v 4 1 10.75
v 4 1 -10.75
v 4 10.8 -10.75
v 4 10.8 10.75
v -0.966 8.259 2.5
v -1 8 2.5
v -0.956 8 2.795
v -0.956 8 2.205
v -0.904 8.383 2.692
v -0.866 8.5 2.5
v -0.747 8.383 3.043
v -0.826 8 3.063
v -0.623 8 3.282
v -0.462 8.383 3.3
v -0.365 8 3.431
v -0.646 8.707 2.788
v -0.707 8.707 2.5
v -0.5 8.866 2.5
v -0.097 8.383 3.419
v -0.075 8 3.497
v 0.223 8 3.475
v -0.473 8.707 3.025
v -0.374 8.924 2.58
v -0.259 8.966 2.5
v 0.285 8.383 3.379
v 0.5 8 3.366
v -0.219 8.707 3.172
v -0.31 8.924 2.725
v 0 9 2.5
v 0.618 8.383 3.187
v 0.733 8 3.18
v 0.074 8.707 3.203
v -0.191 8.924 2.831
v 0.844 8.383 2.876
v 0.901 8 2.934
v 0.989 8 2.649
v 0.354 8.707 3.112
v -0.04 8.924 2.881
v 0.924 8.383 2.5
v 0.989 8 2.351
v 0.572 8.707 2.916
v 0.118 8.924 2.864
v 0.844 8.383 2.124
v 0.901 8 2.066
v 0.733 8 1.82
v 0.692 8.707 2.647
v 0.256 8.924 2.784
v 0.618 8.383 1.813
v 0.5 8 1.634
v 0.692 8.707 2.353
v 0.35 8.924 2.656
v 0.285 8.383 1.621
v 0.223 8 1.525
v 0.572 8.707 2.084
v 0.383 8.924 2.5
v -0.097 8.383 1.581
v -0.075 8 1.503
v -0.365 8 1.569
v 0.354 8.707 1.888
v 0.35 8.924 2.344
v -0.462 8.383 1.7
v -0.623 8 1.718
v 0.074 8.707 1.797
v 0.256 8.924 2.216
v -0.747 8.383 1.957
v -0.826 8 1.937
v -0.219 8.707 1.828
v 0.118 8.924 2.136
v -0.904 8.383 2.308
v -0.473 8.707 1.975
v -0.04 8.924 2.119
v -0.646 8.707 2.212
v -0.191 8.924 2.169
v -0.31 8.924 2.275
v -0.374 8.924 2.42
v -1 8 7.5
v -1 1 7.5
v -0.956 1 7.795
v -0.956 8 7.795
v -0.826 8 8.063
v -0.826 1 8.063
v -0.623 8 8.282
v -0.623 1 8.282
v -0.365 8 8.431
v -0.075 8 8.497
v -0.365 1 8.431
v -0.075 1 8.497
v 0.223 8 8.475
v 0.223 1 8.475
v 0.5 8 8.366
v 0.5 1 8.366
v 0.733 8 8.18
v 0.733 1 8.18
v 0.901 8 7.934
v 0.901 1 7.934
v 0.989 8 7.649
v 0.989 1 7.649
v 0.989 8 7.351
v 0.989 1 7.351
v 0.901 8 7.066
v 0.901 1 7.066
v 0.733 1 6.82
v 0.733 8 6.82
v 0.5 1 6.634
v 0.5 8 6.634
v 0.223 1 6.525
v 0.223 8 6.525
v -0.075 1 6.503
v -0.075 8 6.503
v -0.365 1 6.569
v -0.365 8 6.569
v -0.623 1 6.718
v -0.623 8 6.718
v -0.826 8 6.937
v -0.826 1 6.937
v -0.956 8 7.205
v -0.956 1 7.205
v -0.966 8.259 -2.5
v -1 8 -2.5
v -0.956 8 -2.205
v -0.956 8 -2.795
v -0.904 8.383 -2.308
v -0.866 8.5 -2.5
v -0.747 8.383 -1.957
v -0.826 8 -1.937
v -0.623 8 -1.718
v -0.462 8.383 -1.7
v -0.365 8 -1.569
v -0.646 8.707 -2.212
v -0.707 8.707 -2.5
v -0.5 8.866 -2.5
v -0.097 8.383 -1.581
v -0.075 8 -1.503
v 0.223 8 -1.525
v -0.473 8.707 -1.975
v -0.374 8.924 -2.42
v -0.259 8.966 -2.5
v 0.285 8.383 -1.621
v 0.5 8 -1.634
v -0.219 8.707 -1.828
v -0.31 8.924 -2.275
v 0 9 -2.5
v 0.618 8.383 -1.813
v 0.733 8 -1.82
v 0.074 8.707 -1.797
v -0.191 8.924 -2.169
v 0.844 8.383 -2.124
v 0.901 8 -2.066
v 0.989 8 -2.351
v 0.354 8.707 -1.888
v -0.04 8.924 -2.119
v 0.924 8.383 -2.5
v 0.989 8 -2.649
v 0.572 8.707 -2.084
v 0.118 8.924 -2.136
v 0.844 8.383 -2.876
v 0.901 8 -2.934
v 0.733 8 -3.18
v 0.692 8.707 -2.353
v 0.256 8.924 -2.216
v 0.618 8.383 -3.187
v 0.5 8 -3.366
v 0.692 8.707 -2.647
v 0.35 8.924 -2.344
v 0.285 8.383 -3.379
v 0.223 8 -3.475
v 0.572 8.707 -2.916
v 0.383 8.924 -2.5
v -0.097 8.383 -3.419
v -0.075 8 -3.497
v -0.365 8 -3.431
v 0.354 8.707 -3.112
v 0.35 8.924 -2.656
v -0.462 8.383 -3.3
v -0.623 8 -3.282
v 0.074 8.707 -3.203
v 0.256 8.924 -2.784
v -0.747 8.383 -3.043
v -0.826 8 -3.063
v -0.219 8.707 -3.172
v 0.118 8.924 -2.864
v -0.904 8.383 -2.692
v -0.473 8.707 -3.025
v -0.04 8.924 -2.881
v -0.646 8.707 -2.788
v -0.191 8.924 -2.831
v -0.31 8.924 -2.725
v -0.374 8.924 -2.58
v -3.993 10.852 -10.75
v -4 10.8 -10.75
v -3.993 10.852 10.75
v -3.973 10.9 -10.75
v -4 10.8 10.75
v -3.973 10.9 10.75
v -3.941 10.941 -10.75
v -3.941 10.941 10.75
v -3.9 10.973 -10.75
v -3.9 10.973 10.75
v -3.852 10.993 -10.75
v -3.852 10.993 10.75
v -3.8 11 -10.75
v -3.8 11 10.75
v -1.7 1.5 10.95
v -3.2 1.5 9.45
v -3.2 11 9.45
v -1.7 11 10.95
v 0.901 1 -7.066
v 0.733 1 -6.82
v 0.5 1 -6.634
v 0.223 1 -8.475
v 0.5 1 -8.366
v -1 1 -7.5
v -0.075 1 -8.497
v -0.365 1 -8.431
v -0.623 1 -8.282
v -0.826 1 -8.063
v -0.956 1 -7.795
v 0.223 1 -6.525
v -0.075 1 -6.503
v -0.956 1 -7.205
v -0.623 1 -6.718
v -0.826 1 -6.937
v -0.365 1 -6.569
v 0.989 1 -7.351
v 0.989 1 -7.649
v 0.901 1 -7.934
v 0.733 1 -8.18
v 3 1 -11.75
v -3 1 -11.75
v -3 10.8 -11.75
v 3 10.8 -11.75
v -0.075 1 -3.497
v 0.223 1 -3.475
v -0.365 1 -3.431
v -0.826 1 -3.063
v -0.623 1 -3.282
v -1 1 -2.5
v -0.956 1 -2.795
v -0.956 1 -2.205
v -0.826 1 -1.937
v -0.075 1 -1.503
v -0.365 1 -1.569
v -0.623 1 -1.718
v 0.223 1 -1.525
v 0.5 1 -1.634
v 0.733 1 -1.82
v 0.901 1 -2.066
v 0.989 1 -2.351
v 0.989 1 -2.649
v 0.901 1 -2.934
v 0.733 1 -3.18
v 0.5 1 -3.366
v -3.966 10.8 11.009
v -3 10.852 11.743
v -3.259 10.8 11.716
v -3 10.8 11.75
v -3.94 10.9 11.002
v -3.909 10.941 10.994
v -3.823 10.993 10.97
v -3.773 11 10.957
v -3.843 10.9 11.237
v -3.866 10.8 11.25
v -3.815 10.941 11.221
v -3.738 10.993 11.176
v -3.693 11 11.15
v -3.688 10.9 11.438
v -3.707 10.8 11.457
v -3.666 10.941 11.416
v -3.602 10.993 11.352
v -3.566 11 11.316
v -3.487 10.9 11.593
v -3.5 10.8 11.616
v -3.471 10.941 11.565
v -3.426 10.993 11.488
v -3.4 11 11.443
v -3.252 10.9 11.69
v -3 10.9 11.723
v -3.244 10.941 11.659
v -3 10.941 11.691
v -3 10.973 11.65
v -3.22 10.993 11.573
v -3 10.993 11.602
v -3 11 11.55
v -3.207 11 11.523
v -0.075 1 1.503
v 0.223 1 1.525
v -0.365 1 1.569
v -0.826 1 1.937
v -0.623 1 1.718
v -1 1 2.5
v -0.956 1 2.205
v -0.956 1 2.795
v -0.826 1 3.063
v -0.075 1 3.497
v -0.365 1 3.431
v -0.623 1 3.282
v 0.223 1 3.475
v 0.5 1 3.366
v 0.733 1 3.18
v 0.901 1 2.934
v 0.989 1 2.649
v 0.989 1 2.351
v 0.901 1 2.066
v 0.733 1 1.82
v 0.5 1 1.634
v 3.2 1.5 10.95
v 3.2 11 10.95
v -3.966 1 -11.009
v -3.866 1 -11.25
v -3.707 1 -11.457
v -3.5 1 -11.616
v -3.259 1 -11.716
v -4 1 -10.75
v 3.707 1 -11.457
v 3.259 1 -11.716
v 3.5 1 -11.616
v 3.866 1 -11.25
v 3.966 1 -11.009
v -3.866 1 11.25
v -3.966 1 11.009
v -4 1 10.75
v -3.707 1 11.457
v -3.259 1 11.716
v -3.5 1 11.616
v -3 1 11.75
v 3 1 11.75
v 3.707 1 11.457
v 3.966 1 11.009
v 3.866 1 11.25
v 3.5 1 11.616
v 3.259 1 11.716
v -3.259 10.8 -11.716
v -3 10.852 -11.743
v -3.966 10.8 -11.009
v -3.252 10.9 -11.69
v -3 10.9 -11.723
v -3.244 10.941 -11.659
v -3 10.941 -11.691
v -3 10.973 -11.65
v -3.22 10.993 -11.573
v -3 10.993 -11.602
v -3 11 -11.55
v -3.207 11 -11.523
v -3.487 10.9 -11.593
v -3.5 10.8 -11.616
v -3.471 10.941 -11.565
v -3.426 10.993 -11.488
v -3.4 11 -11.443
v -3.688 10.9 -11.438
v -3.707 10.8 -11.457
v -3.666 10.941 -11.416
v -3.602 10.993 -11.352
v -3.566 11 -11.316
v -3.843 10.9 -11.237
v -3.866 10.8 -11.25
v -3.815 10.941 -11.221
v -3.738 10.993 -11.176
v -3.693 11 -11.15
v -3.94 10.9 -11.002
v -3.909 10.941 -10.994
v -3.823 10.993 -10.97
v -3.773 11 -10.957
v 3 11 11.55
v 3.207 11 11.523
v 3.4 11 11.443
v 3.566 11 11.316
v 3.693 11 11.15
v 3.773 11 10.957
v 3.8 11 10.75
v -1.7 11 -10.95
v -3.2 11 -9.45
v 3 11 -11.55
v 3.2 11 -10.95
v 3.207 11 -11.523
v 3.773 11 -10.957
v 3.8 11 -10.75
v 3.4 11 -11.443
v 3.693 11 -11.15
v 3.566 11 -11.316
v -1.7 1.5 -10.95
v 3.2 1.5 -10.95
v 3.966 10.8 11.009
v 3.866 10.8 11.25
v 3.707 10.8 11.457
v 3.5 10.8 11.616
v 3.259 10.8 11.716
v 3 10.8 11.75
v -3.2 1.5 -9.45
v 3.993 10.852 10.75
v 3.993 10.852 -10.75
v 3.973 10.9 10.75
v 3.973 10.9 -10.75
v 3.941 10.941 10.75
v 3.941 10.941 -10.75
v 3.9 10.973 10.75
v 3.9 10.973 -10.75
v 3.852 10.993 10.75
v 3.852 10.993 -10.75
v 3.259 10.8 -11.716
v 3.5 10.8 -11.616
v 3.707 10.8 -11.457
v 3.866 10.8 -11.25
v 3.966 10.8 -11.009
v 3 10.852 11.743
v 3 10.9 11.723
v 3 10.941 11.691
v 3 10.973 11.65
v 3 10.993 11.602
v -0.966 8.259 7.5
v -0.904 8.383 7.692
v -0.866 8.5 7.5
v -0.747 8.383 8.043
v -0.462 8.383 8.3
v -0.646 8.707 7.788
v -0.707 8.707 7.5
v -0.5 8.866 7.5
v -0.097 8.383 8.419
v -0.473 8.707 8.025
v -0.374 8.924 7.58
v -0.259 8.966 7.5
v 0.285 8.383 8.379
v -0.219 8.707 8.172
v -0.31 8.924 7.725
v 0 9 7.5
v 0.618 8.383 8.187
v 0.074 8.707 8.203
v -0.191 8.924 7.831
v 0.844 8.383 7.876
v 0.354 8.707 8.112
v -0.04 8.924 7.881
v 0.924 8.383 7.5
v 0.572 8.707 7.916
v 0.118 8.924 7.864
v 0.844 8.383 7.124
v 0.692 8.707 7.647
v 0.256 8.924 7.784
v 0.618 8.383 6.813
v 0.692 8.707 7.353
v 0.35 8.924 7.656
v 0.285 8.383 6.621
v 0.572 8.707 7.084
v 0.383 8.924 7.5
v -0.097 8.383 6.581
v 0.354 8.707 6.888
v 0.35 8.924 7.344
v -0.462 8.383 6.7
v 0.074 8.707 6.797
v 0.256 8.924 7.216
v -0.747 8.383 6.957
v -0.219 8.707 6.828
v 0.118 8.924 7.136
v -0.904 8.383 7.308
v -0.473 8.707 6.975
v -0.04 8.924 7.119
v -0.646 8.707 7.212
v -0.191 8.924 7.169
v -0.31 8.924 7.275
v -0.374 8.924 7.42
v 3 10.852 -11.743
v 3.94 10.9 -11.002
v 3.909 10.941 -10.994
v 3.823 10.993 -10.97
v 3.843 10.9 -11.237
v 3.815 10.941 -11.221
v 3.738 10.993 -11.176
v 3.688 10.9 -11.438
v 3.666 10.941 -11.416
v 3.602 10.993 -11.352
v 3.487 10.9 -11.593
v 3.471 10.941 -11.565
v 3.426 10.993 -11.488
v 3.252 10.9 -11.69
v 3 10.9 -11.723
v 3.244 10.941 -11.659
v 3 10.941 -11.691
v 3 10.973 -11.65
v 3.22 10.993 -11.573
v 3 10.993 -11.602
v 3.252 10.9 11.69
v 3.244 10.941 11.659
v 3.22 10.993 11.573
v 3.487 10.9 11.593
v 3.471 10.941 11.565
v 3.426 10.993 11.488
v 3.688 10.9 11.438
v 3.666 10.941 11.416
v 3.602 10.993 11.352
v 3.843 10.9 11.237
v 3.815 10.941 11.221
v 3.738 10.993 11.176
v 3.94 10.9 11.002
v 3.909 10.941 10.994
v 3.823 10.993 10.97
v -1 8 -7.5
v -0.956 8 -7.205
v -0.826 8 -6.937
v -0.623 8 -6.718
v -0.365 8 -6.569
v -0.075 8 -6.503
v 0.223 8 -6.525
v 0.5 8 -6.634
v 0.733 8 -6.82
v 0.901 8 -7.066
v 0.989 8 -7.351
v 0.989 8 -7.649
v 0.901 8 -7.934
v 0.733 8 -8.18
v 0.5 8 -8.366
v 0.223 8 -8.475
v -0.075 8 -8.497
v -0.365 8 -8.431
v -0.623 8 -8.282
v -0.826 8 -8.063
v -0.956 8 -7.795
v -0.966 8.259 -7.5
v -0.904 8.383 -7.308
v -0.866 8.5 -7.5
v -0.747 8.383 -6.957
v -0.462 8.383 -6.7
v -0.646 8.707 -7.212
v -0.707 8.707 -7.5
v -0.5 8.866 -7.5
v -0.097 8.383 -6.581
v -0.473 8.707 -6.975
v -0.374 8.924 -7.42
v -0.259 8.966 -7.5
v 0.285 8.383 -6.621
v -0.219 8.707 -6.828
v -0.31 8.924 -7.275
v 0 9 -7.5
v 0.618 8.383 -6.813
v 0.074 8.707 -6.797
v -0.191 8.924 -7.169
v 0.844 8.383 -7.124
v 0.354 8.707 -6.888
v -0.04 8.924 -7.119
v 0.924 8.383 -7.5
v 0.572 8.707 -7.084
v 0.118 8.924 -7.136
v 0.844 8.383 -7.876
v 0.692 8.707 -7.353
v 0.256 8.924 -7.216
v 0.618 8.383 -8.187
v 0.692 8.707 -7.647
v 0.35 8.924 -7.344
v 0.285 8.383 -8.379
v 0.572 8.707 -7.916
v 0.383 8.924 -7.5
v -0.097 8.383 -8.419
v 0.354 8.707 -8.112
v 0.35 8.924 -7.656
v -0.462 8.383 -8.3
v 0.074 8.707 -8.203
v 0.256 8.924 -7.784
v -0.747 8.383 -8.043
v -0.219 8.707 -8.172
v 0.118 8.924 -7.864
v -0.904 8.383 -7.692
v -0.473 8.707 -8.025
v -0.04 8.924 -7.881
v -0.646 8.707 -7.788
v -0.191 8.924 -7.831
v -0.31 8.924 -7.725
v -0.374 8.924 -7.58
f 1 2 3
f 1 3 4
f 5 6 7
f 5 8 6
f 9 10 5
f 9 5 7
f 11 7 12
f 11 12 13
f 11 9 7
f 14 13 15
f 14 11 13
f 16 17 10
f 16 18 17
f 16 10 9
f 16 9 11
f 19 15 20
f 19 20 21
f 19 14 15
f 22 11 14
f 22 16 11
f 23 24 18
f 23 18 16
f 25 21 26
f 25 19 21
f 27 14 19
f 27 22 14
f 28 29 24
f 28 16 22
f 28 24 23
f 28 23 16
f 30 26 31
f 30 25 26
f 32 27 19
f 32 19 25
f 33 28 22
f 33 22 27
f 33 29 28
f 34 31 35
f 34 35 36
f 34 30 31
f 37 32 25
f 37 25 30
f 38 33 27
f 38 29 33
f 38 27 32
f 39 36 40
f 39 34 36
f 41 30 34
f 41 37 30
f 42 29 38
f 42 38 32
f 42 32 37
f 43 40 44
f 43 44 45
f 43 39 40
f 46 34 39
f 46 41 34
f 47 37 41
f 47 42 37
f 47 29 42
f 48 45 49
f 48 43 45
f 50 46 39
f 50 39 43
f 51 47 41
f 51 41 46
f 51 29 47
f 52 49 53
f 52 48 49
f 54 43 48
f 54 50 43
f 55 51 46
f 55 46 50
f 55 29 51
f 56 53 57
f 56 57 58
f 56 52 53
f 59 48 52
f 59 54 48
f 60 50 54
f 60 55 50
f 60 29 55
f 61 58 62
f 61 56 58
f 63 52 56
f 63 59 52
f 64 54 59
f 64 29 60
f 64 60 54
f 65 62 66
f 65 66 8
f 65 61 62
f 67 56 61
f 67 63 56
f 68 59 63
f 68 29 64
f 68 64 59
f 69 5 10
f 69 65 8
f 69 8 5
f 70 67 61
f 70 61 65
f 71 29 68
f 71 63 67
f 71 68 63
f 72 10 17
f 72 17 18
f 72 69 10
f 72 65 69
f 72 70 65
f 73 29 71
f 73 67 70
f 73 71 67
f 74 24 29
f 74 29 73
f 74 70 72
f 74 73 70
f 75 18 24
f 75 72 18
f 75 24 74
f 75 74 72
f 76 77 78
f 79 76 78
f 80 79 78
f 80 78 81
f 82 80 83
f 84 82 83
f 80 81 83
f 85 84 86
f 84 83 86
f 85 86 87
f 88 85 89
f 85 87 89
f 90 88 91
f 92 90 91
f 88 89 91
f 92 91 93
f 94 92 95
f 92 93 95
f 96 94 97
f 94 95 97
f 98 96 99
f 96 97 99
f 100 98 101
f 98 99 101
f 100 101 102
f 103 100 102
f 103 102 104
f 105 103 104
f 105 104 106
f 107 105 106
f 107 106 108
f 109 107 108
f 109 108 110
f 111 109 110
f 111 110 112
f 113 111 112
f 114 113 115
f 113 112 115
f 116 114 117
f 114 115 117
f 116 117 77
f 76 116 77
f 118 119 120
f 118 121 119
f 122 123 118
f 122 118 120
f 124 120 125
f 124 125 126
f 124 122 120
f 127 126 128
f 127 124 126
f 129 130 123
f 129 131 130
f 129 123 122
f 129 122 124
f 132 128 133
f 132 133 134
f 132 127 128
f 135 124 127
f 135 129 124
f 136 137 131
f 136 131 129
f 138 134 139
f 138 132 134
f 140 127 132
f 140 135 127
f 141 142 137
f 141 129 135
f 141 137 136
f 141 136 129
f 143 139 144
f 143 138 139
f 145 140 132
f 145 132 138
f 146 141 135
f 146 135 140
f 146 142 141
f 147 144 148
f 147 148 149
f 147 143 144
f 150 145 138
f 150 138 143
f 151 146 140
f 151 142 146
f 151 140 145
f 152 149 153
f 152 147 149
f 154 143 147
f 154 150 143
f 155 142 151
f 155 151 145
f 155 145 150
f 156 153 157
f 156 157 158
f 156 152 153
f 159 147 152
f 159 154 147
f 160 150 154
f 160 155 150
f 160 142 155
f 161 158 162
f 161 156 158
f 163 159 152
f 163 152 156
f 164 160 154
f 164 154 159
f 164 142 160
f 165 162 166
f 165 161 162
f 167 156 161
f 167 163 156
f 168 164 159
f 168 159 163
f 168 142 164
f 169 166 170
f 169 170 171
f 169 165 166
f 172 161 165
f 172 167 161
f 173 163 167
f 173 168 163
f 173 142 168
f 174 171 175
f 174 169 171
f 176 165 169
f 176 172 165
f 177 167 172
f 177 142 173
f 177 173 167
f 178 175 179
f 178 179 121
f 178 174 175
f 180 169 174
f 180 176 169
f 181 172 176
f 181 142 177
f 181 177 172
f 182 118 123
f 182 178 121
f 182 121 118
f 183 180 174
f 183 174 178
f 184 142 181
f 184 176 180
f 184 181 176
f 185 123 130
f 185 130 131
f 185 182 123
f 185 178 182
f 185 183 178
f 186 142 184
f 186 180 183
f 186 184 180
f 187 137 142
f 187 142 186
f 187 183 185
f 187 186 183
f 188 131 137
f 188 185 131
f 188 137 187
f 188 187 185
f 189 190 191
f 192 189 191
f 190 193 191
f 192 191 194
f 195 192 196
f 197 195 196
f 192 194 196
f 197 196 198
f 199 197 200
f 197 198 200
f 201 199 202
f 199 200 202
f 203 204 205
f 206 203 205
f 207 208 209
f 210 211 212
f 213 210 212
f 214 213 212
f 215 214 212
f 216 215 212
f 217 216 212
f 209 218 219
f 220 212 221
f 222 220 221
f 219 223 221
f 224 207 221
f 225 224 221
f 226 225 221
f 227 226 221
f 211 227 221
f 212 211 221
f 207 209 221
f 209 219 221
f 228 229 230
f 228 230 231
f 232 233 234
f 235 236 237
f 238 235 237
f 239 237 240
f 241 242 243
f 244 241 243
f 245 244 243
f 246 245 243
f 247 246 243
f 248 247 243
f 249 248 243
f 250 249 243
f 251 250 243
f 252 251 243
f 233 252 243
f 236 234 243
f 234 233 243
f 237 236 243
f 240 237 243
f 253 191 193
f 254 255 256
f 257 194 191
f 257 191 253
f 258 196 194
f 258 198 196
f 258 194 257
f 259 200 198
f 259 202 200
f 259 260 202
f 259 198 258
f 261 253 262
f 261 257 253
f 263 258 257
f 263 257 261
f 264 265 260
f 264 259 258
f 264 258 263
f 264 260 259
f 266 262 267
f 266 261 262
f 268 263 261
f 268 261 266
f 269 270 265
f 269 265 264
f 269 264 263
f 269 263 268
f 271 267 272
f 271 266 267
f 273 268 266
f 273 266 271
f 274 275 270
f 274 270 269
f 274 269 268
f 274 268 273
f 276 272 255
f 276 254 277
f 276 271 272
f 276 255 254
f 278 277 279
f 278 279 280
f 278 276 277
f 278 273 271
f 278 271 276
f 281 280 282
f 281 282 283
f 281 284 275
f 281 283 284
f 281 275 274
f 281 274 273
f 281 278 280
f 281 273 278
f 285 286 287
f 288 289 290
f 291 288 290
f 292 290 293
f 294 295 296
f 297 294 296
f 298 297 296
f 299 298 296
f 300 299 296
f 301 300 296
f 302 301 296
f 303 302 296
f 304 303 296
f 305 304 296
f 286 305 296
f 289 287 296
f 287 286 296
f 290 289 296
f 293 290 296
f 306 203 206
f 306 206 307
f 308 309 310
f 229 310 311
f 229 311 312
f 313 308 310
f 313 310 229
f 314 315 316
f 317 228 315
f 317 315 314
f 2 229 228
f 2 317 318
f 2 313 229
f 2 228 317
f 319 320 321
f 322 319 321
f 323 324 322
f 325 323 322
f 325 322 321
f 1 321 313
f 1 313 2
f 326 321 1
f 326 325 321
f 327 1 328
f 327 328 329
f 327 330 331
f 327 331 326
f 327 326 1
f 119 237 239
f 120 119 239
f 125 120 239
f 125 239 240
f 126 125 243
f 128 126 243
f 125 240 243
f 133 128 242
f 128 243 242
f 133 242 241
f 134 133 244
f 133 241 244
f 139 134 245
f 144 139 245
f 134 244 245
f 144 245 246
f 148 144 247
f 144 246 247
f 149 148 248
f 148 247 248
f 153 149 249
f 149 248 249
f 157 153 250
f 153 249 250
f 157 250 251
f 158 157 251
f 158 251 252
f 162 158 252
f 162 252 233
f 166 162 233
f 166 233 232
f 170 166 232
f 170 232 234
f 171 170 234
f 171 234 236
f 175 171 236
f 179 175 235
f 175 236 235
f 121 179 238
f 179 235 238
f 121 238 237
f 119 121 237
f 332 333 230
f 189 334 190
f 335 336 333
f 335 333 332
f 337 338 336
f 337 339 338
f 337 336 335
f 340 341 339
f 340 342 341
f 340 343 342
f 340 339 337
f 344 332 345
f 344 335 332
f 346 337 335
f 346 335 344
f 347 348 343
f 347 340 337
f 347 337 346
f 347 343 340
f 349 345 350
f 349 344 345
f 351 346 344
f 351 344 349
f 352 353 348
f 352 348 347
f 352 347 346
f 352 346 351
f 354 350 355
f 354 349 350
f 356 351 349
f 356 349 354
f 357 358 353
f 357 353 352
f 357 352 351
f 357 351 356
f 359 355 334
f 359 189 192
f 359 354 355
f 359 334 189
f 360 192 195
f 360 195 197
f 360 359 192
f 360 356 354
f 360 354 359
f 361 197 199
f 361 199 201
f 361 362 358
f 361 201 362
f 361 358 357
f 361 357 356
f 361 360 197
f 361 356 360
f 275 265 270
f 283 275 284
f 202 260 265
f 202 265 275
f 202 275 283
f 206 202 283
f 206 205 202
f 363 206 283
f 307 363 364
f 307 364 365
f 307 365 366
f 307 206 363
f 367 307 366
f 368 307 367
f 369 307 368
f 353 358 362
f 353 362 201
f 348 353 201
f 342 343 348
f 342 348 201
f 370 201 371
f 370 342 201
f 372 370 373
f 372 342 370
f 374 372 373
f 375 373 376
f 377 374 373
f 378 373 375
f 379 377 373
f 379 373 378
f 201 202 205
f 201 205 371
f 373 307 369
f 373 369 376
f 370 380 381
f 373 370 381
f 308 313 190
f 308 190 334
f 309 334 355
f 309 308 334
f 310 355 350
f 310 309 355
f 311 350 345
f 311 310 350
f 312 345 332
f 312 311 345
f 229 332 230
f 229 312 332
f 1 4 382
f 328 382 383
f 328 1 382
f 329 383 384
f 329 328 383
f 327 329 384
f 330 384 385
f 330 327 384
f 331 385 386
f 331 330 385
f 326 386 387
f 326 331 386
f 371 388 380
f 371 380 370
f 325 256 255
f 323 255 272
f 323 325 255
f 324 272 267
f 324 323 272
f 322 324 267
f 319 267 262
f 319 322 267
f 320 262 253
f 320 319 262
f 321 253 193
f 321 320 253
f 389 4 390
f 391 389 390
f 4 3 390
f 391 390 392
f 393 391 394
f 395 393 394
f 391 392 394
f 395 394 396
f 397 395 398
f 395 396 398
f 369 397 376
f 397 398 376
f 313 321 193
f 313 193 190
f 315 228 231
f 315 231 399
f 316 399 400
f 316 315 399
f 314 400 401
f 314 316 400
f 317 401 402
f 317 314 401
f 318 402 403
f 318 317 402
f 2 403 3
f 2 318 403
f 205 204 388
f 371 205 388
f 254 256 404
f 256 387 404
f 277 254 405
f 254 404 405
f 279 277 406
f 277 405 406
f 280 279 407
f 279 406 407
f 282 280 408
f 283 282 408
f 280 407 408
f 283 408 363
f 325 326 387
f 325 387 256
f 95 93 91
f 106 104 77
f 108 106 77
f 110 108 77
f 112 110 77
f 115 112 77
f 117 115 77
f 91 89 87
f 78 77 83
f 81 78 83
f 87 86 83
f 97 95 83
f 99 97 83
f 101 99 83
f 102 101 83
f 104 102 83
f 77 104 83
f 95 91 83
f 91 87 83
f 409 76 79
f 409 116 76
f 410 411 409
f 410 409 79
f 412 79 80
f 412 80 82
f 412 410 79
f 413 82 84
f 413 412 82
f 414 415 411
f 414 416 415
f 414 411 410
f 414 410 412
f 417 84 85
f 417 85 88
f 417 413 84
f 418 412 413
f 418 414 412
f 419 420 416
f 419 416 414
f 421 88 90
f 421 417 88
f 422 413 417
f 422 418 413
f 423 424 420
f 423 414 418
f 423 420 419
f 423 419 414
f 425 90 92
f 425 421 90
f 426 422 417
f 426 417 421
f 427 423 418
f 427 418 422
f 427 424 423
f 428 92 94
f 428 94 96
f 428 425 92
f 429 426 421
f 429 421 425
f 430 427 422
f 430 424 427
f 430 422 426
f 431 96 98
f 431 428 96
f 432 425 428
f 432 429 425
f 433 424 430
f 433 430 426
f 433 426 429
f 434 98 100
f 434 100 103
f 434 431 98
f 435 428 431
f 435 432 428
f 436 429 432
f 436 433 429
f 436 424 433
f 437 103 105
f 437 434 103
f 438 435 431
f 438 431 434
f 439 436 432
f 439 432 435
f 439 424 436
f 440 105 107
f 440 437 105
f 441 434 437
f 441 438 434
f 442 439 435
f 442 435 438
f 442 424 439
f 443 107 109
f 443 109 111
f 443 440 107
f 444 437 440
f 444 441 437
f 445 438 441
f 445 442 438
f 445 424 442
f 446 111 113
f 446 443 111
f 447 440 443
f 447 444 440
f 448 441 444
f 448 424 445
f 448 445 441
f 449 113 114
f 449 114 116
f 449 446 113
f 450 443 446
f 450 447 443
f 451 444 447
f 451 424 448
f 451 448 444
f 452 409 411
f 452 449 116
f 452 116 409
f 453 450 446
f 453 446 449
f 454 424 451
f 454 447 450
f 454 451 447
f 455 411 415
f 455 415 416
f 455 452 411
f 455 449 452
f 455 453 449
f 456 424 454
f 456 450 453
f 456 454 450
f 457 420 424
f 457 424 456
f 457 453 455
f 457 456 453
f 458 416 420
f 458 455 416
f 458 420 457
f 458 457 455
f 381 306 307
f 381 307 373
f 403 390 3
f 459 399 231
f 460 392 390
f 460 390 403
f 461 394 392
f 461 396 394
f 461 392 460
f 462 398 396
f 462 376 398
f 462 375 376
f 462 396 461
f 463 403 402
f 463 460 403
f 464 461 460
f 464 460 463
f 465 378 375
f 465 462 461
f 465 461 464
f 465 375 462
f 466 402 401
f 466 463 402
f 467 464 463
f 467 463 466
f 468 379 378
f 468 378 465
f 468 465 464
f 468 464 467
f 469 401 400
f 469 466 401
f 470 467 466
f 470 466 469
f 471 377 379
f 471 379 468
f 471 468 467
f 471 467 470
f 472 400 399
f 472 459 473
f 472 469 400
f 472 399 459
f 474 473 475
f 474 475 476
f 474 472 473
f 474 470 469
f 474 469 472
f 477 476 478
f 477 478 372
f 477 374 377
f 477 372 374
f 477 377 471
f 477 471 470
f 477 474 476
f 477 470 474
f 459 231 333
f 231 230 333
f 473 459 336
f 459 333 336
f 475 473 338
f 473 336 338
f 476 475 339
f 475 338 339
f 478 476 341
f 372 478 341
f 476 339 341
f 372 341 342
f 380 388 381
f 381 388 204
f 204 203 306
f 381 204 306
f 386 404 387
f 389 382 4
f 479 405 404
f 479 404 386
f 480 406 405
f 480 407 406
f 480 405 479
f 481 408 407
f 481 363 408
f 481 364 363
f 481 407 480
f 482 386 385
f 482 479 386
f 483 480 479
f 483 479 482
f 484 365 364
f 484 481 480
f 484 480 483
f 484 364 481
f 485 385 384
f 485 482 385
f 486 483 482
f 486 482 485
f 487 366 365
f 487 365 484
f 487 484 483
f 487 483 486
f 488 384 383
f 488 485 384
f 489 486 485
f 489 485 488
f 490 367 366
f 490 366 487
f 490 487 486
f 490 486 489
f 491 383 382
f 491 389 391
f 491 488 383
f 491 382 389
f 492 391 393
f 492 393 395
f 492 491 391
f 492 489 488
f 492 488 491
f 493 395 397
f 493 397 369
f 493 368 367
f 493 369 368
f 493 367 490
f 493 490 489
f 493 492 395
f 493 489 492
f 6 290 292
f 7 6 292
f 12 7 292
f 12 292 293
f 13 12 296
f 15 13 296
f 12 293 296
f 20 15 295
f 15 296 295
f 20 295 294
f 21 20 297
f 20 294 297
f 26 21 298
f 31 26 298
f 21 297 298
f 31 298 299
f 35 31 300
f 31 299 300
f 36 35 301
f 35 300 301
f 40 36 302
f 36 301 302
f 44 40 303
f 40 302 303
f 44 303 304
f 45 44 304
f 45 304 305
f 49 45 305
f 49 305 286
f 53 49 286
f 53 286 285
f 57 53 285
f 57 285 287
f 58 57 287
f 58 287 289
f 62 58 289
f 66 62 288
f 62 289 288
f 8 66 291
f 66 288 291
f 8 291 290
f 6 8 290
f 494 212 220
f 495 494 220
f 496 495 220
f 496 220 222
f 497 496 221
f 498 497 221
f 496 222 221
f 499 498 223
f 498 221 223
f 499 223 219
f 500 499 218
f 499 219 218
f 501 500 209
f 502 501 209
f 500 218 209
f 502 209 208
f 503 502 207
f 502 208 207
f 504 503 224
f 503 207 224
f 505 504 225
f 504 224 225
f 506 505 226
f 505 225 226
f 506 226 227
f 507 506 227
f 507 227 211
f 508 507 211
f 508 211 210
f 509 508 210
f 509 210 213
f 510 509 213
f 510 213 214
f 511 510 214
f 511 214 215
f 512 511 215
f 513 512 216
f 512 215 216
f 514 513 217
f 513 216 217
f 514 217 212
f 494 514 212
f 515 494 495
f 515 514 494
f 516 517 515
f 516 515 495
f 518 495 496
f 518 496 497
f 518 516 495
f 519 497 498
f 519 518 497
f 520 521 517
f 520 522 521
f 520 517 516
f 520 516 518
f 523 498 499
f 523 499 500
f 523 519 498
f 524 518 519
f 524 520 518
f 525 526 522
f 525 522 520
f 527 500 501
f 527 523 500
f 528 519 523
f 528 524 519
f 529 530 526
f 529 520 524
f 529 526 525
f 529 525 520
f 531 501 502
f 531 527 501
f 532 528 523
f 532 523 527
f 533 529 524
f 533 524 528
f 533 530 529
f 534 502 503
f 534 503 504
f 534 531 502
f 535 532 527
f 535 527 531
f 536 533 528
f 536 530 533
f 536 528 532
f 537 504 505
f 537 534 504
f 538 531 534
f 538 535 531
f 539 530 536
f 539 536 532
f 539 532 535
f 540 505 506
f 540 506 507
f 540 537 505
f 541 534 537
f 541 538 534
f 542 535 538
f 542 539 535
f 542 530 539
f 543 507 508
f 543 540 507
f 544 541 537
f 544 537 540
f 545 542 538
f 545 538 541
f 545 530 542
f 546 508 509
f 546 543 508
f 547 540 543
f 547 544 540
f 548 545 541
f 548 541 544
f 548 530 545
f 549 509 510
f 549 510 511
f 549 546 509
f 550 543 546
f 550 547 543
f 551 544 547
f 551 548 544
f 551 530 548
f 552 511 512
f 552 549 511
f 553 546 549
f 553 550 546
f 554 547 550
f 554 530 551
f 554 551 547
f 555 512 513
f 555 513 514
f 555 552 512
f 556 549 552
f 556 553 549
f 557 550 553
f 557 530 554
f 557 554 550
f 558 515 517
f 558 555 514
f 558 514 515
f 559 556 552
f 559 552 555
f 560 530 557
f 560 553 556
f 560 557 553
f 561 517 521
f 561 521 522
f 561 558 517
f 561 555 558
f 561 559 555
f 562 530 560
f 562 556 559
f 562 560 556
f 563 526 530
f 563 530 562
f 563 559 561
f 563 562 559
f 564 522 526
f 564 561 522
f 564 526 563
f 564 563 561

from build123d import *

# Parameters (mm, degrees)
CROQUIS1_W            = 8
CROQUIS1_H            = 23.5
CROQUIS1_W_2          = 6.4
CROQUIS1_H_2          = 21.9
EXTRUIR1_DEPTH        = 11
CHAFL_N1_SIZE         = 1.5
REDONDEO1_R           = 1
REDONDEO2_R           = 0.2
EXTRUIR2_DEPTH        = 1
CROQUIS3_R            = 1
EXTRUIR4_DEPTH        = 8
EXTRUIR4_2_DEPTH      = 8
EXTRUIR4_3_DEPTH      = 8
EXTRUIR4_4_DEPTH      = 8
REDONDEO3_R           = 1
REDONDEO4_R           = 1
REDONDEO5_R           = 1
REDONDEO6_R           = 1
CROQUIS4_W            = 24.783427495
CROQUIS4_H            = 1.401443817
CORTAR_EXTRUIR1_DEPTH = 14
EXTRUIR5_DEPTH        = 0.5


with BuildPart() as part:
    # Croquis1 → Extruir1 (new body)
    with BuildSketch(Plane(origin=(0, 0, 0), x_dir=(1, 0, 0), z_dir=(0, 1, 0))):
        Rectangle(CROQUIS1_W, CROQUIS1_H)
        Rectangle(CROQUIS1_W_2, CROQUIS1_H_2, mode=Mode.SUBTRACT)
    extrude(amount=EXTRUIR1_DEPTH)

    # Chaflán1
    chafl_n1_edges = [part.edges().sort_by_distance(p)[0] for p in [
        (-3.2, 5.5, -10.95),
        (-3.2, 5.5, 10.95),
    ]]
    chamfer(chafl_n1_edges, length=CHAFL_N1_SIZE)

    # Redondeo1
    redondeo1_edges = [part.edges().sort_by_distance(p)[0] for p in [
        (-4, 5.5, -11.75),
        (4, 5.5, -11.75),
        (4, 5.5, 11.75),
        (-4, 5.5, 11.75),
    ]]
    fillet(redondeo1_edges, radius=REDONDEO1_R)

    # Redondeo2
    redondeo2_edges = [part.edges().sort_by_distance(p)[0] for p in [
        (0, 11, 11.75),
        (-4, 11, 0),
        (4, 11, 0),
        (0, 11, -11.75),
        (-3.707106781, 11, -11.457106781),
        (3.707106781, 11, -11.457106781),
        (3.707106781, 11, 11.457106781),
        (-3.707106781, 11, 11.457106781),
    ]]
    fillet(redondeo2_edges, radius=REDONDEO2_R)

    # Croquis2 → Extruir2 (add)
    with BuildSketch(Plane.XZ):
        with BuildLine():
            Line((3, 11.75), (-3, 11.75))
            ThreePointArc((-3, 11.75), (-3.707106781, 11.457106781), (-4, 10.75))
            Line((-4, 10.75), (-4, -10.75))
            ThreePointArc((-4, -10.75), (-3.707106781, -11.457106781), (-3, -11.75))
            Line((-3, -11.75), (3, -11.75))
            ThreePointArc((3, -11.75), (3.707106781, -11.457106781), (4, -10.75))
            Line((4, -10.75), (4, 10.75))
            ThreePointArc((4, 10.75), (3.707106781, 11.457106781), (3, 11.75))
        make_face()
    extrude(amount=-EXTRUIR2_DEPTH)

    # Croquis4 → Cortar-Extruir1 (cut)
    with BuildSketch(Plane.ZY.offset(4)):
        with Locations((-0.0368801, 0.299278091)):
            Rectangle(CROQUIS4_W, CROQUIS4_H)
    extrude(amount=-CORTAR_EXTRUIR1_DEPTH, mode=Mode.SUBTRACT)


with BuildPart() as body_2:
    # Croquis3 → Extruir4 (new body)
    with BuildSketch(Plane(origin=(0, 1, 0), x_dir=(-1, 0, 0), z_dir=(0, 1, 0))):
        with Locations((0, 7.5)):
            Circle(CROQUIS3_R)
    extrude(amount=EXTRUIR4_DEPTH)

    # Redondeo6
    redondeo6_edges = [body_2.edges().sort_by_distance(p)[0] for p in [
        (1, 9, 7.5),
    ]]
    fillet(redondeo6_edges, radius=REDONDEO6_R)


with BuildPart() as body_3:
    # Croquis3 → Extruir4 2 (new body)
    with BuildSketch(Plane(origin=(0, 1, 0), x_dir=(-1, 0, 0), z_dir=(0, 1, 0))):
        with Locations((0, 2.5)):
            Circle(CROQUIS3_R)
    extrude(amount=EXTRUIR4_2_DEPTH)

    # Redondeo5
    redondeo5_edges = [body_3.edges().sort_by_distance(p)[0] for p in [
        (1, 9, 2.5),
    ]]
    fillet(redondeo5_edges, radius=REDONDEO5_R)


with BuildPart() as body_4:
    # Croquis3 → Extruir4 3 (new body)
    with BuildSketch(Plane(origin=(0, 1, 0), x_dir=(-1, 0, 0), z_dir=(0, 1, 0))):
        with Locations((0, -2.5)):
            Circle(CROQUIS3_R)
    extrude(amount=EXTRUIR4_3_DEPTH)

    # Redondeo4
    redondeo4_edges = [body_4.edges().sort_by_distance(p)[0] for p in [
        (1, 9, -2.5),
    ]]
    fillet(redondeo4_edges, radius=REDONDEO4_R)


with BuildPart() as body_5:
    # Croquis3 → Extruir4 4 (new body)
    with BuildSketch(Plane(origin=(0, 1, 0), x_dir=(-1, 0, 0), z_dir=(0, 1, 0))):
        with Locations((0, -7.5)):
            Circle(CROQUIS3_R)
    extrude(amount=EXTRUIR4_4_DEPTH)

    # Redondeo3
    redondeo3_edges = [body_5.edges().sort_by_distance(p)[0] for p in [
        (1, 9, -7.5),
    ]]
    fillet(redondeo3_edges, radius=REDONDEO3_R)


with BuildPart() as body_6:
    # Croquis5 → Extruir5 (new body)
    with BuildSketch(Plane.XZ.offset(-1)):
        with BuildLine():
            Line((-4, 10.75), (-4, -10.75))
            ThreePointArc((-4, -10.75), (-3.707106781, -11.457106781), (-3, -11.75))
            Line((-3, -11.75), (3, -11.75))
            ThreePointArc((3, -11.75), (3.707106781, -11.457106781), (4, -10.75))
            Line((4, -10.75), (4, 10.75))
            ThreePointArc((4, 10.75), (3.707106781, 11.457106781), (3, 11.75))
            Line((3, 11.75), (-3, 11.75))
            ThreePointArc((-3, 11.75), (-3.707106781, 11.457106781), (-4, 10.75))
        make_face()
    extrude(amount=-EXTRUIR5_DEPTH)

    # Combinar1: union part
    add(part.part)


solid = Compound([body_2.part, body_3.part, body_4.part, body_5.part, body_6.part])
